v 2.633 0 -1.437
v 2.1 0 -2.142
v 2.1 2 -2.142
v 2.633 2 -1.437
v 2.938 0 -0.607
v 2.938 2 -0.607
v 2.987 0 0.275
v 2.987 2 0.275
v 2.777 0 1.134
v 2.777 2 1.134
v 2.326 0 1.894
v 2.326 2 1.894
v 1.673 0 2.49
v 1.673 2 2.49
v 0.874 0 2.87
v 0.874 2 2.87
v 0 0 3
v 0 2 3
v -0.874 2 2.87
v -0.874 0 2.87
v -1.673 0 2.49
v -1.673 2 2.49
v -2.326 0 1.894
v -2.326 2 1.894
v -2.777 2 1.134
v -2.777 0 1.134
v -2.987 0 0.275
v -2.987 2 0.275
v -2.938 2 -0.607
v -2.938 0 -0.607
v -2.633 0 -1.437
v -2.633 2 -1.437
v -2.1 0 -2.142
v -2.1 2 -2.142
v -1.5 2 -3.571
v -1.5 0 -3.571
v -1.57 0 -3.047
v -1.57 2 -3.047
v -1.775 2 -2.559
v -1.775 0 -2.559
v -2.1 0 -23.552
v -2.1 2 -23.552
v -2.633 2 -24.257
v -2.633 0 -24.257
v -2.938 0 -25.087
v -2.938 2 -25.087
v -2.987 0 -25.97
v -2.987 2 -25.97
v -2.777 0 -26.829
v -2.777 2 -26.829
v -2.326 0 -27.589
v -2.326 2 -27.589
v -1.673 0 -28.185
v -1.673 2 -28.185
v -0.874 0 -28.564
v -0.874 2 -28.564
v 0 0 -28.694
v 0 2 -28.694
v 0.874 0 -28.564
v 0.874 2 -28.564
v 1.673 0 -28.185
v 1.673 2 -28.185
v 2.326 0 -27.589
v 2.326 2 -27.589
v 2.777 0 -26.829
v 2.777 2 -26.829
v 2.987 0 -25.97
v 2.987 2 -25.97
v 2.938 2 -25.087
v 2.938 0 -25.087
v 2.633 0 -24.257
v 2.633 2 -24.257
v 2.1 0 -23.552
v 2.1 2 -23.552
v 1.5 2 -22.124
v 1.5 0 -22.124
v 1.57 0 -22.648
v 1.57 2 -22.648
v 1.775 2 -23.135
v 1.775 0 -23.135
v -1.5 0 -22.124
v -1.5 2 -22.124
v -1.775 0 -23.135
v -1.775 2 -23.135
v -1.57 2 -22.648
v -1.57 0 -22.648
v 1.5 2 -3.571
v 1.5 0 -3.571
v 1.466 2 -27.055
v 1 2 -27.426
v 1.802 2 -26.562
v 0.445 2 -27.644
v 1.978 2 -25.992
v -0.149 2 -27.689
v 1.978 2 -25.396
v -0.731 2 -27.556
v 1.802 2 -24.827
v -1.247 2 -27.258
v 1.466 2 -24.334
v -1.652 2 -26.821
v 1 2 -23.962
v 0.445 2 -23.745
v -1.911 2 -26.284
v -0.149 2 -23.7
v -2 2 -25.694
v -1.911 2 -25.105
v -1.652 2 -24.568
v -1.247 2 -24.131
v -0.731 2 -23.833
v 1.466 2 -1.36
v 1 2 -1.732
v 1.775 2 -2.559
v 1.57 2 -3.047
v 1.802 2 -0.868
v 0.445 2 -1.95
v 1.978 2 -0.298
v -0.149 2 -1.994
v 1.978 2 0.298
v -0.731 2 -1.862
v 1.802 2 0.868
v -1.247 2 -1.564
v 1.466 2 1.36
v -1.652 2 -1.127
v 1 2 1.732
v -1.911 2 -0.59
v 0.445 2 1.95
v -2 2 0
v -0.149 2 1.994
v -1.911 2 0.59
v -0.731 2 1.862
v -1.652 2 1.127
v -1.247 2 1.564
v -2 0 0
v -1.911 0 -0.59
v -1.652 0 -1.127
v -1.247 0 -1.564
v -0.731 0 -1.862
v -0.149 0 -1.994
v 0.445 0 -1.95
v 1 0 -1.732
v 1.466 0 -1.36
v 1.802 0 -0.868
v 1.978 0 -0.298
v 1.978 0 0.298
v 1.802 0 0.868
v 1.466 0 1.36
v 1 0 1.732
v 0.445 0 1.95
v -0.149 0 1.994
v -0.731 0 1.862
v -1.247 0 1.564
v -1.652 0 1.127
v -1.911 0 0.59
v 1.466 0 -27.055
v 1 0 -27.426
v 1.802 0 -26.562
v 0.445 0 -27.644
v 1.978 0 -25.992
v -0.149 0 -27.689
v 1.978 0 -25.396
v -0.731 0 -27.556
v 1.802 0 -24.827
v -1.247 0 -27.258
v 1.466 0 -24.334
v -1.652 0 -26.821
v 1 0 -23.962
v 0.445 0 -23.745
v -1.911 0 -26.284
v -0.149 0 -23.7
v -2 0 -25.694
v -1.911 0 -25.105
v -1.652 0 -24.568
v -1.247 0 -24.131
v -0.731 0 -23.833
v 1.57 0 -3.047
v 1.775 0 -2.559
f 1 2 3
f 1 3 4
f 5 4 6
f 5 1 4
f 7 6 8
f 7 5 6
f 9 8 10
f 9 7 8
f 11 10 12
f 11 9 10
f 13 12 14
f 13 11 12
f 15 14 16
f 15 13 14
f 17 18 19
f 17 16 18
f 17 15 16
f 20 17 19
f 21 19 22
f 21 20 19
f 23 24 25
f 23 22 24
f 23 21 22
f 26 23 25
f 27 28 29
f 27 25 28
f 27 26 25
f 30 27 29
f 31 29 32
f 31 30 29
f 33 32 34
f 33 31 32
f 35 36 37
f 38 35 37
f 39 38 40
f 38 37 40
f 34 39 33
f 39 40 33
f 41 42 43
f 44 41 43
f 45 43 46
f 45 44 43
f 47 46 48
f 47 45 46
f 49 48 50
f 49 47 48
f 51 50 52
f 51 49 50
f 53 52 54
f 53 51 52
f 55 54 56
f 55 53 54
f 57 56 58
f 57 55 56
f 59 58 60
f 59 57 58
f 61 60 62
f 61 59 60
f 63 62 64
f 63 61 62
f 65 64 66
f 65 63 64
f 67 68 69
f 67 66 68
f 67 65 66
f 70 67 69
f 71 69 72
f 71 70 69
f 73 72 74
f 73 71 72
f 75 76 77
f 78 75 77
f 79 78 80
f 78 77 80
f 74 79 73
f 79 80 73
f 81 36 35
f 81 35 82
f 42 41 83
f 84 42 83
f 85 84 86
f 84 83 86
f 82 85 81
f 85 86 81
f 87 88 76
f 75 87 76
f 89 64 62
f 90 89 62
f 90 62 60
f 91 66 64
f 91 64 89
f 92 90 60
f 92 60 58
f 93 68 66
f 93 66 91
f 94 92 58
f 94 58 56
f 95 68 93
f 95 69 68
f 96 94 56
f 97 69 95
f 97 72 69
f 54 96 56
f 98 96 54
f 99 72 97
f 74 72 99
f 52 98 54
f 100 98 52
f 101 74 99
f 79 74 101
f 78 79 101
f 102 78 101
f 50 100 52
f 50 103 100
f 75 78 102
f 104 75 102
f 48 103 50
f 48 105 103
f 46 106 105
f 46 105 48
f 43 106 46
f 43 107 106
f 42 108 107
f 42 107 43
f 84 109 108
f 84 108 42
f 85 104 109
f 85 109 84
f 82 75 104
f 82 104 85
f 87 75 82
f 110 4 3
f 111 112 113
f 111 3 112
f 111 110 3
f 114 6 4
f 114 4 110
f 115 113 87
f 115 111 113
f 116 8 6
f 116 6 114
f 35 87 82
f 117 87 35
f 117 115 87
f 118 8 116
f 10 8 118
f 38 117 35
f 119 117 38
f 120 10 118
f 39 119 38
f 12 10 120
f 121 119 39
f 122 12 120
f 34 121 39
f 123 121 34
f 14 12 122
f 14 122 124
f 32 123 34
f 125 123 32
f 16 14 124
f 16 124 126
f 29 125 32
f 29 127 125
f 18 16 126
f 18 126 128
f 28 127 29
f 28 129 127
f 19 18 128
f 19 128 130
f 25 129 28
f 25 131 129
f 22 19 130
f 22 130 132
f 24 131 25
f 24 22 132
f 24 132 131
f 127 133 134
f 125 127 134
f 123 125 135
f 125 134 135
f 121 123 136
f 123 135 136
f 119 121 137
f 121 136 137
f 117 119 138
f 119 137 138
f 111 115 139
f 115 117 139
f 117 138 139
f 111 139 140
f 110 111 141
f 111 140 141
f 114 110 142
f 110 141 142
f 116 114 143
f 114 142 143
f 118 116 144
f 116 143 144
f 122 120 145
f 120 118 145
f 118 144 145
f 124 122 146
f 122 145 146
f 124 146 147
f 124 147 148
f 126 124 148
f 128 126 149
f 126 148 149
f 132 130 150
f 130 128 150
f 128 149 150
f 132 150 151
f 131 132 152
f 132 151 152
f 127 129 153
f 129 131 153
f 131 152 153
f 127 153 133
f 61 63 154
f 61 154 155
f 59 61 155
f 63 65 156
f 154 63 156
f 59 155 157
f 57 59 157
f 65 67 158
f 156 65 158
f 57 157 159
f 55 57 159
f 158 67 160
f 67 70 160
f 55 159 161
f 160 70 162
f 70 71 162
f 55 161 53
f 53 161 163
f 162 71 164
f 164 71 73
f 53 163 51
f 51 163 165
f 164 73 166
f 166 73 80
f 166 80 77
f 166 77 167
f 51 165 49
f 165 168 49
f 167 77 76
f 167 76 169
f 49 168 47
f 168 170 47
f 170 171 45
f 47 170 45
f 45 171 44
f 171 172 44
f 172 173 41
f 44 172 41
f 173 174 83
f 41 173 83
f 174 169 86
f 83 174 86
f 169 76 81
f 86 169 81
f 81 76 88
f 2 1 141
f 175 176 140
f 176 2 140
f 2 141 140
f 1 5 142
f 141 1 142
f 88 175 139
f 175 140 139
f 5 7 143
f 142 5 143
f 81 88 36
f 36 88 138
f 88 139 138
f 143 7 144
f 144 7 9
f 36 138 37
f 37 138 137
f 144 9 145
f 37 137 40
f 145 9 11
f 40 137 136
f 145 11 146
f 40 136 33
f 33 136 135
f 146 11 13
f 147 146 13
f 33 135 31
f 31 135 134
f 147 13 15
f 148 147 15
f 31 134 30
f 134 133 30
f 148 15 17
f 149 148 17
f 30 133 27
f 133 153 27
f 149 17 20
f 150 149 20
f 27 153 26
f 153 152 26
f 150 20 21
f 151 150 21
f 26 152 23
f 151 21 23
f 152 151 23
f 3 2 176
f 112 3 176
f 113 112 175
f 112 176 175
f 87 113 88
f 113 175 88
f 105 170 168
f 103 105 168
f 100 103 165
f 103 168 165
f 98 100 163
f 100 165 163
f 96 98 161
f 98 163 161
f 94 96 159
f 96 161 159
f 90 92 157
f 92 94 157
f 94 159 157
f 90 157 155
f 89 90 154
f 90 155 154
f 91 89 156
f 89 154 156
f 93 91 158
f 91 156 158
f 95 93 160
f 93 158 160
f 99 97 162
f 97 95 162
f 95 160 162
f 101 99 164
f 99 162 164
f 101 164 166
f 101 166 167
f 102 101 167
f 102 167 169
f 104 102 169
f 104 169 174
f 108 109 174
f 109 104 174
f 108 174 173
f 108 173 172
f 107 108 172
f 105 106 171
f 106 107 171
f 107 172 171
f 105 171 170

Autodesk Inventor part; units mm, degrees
ref_plane "YZ Plane" through (0, 0, 0) normal (1, 0, 0) x (0, 1, 0)
ref_plane "XZ Plane" through (0, 0, 0) normal (0, 1, 0) x (-1, 0, 0)
ref_plane "XY Plane" through (0, 0, 0) normal (0, 0, 1) x (1, 0, 0)
sketch "Sketch1" plane through (0, 0, 0) normal (0, 1, 0) x (-1, 0, 0)
  circle A0 centre (0, 0) radius 2
  arc A1 (2.1, -2.1424) -> (-2.1, -2.1424) centre (0, 0) ccw
  circle A2 centre (0, -25.6944) radius 2
  arc A3 (-2.1, -23.5519) -> (2.1, -23.5519) centre (0, -25.6944) ccw
  line L0 (1.5, -3.5707) -> (1.5, -22.1236)
  line L1 (-1.5, -3.5707) -> (-1.5, -22.1236)
  line L2 (0, 0) -> (0, -25.6944) construction
  arc A4 (2.1, -2.1424) -> (1.5, -3.5707) centre (3.5, -3.5707) ccw
  arc A5 (-1.5, -3.5707) -> (-2.1, -2.1424) centre (-3.5, -3.5707) ccw
  arc A6 (-2.1, -23.5519) -> (-1.5, -22.1236) centre (-3.5, -22.1236) ccw
  arc A7 (1.5, -22.1236) -> (2.1, -23.5519) centre (3.5, -22.1236) ccw
  point P0 (1.5, -2.5981)
  point P1 (-1.5, -23.0963)
  point P2 (-1.5, -2.5981)
  point P3 (1.5, -23.0963)
  dimension "d0" = 4
  dimension "d1" = 6
  dimension "d2" = 25.6944
  dimension "d3" = 4
  dimension "d4" = 6
  dimension "d5" = 3
  dimension "d6" = 2
extrude "Extrusion1" add sketch "Sketch1" along normal blind 2
equation "\"d2\" = length"
equation "\"d3\" = d0"
equation "\"d4\" = d1"
equation "\"length\" = 25.69436"
properties part number "dip_pip_tendon"
